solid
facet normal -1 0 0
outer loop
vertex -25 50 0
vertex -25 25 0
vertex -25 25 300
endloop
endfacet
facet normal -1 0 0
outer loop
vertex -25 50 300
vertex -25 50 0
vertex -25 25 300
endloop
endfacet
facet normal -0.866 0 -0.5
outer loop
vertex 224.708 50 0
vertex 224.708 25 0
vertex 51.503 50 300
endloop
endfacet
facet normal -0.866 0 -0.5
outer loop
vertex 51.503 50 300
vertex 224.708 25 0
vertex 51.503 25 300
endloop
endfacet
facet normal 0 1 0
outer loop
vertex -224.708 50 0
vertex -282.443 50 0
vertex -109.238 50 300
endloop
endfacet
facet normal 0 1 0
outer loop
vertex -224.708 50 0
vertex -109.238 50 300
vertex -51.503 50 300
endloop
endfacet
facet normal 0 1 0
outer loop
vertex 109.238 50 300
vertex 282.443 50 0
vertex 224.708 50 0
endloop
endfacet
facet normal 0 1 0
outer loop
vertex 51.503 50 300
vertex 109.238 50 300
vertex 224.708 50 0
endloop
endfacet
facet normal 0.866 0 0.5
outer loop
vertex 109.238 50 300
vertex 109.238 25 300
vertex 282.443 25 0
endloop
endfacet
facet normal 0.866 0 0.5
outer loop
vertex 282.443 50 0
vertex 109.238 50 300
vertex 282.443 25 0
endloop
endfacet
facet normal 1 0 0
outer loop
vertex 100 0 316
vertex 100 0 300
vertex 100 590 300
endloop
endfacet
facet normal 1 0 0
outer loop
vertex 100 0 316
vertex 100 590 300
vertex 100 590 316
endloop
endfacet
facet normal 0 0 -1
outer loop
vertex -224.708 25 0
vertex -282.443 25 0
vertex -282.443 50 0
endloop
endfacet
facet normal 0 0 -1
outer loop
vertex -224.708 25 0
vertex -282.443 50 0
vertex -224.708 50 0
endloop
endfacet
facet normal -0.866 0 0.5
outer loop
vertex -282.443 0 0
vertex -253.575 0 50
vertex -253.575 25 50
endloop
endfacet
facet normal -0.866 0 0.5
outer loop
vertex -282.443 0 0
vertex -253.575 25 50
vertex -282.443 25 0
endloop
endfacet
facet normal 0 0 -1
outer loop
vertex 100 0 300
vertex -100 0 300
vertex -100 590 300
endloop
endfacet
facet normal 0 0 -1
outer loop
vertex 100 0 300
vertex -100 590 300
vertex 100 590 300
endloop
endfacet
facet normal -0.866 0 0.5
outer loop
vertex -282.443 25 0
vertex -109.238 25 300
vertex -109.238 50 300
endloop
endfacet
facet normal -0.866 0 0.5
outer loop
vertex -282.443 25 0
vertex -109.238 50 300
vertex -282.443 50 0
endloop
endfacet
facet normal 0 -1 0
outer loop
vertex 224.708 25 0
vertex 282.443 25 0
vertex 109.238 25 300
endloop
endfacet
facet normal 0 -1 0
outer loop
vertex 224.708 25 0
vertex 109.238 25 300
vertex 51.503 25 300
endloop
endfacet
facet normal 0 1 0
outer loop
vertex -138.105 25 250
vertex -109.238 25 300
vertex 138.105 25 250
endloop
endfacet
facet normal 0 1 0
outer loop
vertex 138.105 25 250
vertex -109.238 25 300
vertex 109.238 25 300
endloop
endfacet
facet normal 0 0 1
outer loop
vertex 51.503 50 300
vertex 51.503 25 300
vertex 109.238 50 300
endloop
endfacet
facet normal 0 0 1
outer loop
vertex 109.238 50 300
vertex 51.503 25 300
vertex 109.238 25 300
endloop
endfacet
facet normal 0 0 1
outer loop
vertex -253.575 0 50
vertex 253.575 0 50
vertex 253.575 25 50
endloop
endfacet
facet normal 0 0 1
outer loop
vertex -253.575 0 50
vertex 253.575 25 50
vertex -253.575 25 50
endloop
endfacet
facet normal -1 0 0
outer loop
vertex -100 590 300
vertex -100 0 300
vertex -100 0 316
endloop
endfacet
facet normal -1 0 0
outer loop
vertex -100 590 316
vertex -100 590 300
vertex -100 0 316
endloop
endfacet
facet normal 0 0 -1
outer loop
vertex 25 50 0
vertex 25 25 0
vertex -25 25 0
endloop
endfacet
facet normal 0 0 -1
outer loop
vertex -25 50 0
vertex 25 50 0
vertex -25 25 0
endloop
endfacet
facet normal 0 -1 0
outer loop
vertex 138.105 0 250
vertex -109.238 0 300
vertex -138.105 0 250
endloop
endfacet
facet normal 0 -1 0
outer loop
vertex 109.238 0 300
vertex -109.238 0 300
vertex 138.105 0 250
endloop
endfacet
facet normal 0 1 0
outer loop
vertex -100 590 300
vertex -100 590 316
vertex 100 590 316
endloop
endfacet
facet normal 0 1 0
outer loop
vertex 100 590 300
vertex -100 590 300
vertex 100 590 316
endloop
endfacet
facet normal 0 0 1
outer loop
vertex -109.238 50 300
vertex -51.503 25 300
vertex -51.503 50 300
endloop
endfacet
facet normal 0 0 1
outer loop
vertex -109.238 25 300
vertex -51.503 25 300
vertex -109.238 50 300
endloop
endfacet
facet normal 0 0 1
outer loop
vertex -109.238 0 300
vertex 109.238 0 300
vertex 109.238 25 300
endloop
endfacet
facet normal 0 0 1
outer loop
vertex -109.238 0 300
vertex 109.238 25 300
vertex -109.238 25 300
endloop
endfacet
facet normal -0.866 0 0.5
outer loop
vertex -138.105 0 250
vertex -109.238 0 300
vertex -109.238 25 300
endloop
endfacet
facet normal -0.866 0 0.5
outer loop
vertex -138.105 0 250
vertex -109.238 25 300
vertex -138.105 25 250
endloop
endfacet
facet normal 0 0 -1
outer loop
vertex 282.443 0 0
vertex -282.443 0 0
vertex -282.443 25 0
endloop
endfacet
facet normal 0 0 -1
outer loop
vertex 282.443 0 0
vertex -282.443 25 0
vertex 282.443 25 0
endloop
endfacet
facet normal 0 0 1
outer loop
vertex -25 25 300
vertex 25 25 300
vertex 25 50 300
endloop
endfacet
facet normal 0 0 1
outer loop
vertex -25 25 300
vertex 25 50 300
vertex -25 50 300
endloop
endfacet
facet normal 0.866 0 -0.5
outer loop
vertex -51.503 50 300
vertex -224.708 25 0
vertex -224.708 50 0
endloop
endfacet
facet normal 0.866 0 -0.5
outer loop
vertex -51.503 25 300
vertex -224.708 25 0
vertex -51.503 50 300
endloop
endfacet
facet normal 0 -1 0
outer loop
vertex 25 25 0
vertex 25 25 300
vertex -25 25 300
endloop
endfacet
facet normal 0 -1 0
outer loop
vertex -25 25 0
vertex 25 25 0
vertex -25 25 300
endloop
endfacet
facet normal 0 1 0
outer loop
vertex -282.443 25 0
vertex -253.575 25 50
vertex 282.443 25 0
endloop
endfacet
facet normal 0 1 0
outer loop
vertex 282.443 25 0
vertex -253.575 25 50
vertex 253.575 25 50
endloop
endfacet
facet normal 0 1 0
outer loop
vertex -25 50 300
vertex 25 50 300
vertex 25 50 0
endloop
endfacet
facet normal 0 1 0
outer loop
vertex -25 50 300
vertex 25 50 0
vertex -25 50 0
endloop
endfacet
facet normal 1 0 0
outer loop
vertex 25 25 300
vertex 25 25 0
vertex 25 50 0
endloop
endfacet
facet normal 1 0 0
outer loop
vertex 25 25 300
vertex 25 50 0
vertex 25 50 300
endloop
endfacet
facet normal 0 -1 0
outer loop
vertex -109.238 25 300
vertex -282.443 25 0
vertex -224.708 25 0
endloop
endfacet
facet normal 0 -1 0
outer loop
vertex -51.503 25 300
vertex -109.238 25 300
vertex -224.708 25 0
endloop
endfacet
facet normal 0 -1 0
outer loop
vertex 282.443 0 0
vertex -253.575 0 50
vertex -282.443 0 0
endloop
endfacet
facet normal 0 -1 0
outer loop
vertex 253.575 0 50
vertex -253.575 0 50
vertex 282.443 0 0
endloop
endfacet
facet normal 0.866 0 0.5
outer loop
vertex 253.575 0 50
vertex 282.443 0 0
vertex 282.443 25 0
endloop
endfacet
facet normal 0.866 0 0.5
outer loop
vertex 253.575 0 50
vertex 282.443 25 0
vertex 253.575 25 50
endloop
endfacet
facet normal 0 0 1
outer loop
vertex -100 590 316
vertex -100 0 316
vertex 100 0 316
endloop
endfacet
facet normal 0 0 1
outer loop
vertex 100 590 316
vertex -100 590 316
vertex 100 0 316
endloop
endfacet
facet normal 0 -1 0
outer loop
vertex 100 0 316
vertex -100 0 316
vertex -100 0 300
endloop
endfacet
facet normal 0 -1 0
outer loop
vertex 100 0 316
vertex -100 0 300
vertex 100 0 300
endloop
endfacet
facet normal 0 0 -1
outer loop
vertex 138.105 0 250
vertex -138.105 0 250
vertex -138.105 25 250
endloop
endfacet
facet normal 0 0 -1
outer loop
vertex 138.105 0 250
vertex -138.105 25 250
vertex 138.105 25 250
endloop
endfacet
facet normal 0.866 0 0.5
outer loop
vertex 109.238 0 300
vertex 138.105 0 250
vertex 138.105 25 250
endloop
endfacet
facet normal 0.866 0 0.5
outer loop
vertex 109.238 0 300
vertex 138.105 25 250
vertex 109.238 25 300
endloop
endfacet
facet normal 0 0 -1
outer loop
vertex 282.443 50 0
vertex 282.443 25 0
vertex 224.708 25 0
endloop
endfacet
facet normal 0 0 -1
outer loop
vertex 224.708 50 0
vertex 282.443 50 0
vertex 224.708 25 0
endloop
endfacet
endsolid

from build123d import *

# Parameters (mm, degrees)
F0_W     = 200
F0_H     = 16
F1_DEPTH = 590
F3_DEPTH = 25
F5_DEPTH = 25
F6_W     = 50
F6_H     = 300
F7_DEPTH = 25
F9_DEPTH = 25


with BuildPart() as f1:
    # F0 (on Front) → F1 (new body)
    with BuildSketch(Plane.XZ):
        with Locations((0, 308)):
            Rectangle(F0_W, F0_H)
    extrude(amount=-F1_DEPTH)


with BuildPart() as f3:
    # F2 (on Front) → F3 (new body)
    with BuildSketch(Plane.XZ):
        Polygon((-109.237604, 300), (-138.105118, 250), (138.105118, 250), (109.237604, 300), align=None)
    extrude(amount=-F3_DEPTH)


with BuildPart() as f5:
    # F4 (on Front) → F5 (new body)
    with BuildSketch(Plane.XZ):
        Polygon((-253.575172, 50), (-282.442685, 0), (282.442685, 0), (253.575172, 50), align=None)
    extrude(amount=-F5_DEPTH)


with BuildPart() as f7:
    # F6 (on face) → F7 (new body)
    with BuildSketch(Plane(origin=(0, 25, 0), x_dir=(-1, 0, 0), z_dir=(0, 1, 0))):
        with Locations((0, 150)):
            Rectangle(F6_W, F6_H)
    extrude(amount=F7_DEPTH)


with BuildPart() as f9:
    # F8 (on face) → F9 (new body)
    with BuildSketch(Plane(origin=(0, 25, 0), x_dir=(-1, 0, 0), z_dir=(0, 1, 0))):
        Polygon((-109.237604, 300), (-282.442685, 0), (-224.707658, 0), (-51.502577, 300), align=None)
    extrude(amount=F9_DEPTH)


with BuildPart() as f10_1:
    # F10: instance of F9
    add(f9.part.mirror(Plane.YZ))


solid = Compound([f1.part, f3.part, f5.part, f7.part, f9.part, f10_1.part])
